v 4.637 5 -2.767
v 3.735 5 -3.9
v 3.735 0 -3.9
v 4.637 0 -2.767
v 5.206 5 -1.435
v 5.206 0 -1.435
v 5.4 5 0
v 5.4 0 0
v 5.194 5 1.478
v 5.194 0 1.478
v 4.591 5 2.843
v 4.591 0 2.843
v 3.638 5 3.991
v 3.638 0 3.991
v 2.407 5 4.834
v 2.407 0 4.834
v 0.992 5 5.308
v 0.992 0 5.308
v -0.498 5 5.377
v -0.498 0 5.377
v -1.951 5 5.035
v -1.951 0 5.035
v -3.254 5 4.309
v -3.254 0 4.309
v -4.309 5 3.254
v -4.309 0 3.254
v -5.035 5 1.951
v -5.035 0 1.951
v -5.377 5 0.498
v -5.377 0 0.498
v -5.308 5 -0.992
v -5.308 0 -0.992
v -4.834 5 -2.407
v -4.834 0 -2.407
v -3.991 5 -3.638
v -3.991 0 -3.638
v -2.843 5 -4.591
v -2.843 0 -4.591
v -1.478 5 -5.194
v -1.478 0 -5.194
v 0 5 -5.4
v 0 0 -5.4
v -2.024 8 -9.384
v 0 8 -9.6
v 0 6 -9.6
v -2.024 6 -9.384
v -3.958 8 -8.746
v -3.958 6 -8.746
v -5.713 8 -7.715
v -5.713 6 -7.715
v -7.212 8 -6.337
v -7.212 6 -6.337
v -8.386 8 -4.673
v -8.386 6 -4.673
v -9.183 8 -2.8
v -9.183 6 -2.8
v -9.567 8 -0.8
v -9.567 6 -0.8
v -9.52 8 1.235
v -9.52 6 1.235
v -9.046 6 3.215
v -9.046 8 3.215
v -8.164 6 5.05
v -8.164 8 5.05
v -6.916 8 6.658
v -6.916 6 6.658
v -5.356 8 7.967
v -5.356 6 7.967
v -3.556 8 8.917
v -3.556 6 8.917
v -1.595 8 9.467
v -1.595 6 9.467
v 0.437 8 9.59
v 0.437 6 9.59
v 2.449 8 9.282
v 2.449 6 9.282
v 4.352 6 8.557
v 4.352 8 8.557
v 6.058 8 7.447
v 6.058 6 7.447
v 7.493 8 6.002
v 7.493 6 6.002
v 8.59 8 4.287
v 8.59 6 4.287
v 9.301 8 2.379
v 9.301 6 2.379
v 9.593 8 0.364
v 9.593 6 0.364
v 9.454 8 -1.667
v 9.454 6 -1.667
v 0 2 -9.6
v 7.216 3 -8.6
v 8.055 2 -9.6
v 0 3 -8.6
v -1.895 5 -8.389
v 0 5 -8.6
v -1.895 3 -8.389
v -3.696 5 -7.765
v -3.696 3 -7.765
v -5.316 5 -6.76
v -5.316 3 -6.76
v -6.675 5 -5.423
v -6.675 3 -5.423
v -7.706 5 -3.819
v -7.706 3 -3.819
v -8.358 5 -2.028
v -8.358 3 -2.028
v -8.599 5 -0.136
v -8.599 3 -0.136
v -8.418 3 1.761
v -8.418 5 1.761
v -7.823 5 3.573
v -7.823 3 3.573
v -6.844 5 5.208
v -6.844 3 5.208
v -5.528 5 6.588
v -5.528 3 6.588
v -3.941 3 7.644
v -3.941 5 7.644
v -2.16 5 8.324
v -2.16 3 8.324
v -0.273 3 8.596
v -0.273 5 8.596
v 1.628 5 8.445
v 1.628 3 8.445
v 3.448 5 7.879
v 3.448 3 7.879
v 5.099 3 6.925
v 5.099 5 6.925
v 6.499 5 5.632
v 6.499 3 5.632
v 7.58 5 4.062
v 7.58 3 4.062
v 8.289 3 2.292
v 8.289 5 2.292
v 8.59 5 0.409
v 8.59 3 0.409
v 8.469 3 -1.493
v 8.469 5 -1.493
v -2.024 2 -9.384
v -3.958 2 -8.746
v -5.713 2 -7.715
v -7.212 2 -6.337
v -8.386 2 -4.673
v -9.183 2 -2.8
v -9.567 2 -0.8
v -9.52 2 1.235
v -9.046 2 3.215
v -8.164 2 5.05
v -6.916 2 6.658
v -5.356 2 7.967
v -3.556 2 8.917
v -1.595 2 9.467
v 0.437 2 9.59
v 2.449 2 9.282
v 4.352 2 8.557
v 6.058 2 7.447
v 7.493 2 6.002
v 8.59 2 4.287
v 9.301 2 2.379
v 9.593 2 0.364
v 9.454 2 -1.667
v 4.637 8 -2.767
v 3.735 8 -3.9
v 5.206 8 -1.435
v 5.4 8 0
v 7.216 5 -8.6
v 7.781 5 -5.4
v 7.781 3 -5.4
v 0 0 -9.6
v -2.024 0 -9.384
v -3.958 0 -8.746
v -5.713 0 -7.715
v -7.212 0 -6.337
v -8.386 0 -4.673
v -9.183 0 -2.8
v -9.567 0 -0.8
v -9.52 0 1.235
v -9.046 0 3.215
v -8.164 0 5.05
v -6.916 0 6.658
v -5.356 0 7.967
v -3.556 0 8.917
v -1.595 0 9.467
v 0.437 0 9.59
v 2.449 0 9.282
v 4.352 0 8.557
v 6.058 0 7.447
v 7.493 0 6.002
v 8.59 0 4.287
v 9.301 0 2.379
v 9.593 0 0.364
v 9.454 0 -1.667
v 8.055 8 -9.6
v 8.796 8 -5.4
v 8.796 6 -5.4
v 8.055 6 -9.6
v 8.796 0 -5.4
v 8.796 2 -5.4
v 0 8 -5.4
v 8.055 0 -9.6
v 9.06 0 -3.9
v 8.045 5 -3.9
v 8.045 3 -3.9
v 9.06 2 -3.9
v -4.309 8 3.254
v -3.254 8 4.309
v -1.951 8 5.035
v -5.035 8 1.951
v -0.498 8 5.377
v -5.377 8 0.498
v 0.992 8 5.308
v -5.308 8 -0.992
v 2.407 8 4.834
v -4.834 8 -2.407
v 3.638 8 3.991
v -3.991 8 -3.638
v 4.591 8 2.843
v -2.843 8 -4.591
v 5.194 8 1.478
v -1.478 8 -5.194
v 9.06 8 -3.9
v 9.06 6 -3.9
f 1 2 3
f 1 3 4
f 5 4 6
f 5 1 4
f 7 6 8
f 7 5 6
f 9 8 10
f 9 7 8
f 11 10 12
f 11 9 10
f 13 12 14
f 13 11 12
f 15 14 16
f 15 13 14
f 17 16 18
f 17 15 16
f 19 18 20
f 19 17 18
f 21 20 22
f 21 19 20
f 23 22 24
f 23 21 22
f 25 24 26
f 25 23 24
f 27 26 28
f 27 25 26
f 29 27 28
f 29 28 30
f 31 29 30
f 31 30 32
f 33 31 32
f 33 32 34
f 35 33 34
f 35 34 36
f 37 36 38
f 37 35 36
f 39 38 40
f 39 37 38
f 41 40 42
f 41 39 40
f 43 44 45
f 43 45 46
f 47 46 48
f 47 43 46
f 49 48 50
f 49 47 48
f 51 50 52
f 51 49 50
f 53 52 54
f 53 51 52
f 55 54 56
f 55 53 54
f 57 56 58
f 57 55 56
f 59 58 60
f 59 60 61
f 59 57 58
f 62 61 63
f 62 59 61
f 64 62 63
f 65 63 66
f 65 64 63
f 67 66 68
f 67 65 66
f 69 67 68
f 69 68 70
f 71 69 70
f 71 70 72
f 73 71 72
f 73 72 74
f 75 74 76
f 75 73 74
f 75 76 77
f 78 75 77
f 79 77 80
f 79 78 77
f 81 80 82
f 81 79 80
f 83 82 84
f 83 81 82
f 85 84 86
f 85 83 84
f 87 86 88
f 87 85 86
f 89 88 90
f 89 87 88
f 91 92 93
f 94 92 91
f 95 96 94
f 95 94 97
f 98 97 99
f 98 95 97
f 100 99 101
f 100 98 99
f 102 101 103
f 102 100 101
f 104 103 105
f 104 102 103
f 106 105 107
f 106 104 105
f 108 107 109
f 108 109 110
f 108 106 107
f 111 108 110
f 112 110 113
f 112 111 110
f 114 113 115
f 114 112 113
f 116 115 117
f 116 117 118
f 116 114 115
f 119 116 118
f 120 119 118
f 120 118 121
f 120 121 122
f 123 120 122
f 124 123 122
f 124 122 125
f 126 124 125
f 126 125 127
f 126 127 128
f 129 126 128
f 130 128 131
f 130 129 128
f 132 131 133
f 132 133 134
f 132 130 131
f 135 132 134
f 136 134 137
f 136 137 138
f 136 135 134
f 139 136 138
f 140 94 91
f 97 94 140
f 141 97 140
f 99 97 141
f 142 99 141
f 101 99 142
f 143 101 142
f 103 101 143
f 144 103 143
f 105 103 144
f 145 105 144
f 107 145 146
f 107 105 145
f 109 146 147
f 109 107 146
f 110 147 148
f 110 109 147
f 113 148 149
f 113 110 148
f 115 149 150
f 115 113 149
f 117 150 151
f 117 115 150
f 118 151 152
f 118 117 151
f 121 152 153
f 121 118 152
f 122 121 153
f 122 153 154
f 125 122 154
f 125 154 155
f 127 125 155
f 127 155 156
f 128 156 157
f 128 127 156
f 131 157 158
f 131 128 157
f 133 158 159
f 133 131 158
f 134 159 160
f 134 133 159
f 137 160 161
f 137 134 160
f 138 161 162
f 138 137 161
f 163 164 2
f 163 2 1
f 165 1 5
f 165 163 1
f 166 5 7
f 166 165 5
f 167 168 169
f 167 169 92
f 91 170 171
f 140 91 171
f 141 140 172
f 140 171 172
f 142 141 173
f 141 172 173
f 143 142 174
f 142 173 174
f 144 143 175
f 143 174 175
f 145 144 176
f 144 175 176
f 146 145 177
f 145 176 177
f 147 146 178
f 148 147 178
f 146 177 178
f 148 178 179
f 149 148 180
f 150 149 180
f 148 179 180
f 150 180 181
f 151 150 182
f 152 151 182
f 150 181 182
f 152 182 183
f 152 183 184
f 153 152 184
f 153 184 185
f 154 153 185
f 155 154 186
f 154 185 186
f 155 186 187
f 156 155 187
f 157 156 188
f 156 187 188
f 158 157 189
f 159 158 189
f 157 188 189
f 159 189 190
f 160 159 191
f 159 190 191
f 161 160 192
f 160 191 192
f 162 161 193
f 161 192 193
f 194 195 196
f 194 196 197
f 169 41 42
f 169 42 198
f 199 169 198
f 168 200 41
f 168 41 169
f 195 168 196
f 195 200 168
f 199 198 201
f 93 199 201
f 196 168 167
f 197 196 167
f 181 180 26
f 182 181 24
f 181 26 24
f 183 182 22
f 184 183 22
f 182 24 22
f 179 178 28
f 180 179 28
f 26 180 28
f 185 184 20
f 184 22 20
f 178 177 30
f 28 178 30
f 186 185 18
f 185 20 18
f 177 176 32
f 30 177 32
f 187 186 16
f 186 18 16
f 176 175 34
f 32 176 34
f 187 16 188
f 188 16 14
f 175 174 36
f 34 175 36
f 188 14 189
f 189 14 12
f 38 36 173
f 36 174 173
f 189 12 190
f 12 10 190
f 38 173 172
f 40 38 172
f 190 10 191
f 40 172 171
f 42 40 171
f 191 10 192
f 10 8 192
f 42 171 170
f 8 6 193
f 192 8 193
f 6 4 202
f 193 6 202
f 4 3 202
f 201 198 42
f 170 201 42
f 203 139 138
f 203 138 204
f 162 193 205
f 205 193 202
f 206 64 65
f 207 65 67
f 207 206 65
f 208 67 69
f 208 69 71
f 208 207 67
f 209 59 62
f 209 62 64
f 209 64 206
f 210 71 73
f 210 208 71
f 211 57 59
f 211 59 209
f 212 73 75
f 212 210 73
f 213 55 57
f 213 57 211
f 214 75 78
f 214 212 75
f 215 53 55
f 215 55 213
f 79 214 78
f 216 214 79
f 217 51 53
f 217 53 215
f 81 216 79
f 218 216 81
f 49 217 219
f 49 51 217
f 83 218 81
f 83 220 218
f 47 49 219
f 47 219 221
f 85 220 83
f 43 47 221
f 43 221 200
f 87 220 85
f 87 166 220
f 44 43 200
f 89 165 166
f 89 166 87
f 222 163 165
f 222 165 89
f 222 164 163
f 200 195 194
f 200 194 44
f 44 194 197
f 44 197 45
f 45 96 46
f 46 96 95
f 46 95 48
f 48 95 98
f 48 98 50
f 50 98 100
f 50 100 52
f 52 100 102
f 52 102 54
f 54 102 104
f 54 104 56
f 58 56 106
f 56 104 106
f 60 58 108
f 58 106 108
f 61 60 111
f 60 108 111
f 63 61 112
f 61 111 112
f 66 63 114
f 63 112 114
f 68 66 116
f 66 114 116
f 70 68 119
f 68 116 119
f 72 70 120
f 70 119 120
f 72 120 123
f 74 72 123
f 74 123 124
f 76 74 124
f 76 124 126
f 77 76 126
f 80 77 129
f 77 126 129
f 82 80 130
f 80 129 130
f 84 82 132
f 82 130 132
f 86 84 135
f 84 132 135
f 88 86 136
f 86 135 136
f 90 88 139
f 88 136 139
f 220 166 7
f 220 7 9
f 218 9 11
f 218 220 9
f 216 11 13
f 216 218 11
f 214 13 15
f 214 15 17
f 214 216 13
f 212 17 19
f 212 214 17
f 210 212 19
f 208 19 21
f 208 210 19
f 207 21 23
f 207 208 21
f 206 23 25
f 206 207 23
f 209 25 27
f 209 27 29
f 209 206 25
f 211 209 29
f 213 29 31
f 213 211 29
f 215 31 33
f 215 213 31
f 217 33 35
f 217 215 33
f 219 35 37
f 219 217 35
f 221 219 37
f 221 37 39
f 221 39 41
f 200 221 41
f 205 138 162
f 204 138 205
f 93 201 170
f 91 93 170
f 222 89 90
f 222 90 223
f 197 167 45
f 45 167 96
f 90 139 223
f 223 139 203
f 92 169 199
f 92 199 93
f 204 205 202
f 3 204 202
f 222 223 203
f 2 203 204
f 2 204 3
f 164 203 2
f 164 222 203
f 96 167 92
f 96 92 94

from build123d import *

# Parameters (mm, degrees)
BOSS_EXTRUDE1_DEPTH = 3
CHAMFER1_SIZE       = 1
BOSS_EXTRUDE2_DEPTH = 1


with BuildPart() as part:
    # Sketch1 → Boss-Extrude1 (new body)
    with BuildSketch(Plane(origin=(0, 0, 0), x_dir=(1, 0, 0), z_dir=(0, 1, 0))):
        with BuildLine():
            Line((8.055356459, 9.6), (0, 9.6))
            ThreePointArc((0, 9.6), (-6.170761053, -7.354026654), (9.454154429, 1.667022506))
            Line((9.454154429, 1.667022506), (9.060420249, 3.9))
            Line((9.060420249, 3.9), (3.734969879, 3.9))
            ThreePointArc((3.734969879, 3.9), (4.96632849, 2.120278596), (5.4, 0))
            ThreePointArc((5.4, 0), (-3.818376618, -3.818376618), (0, 5.4))
            Line((0, 5.4), (8.795929778, 5.4))
            Line((8.795929778, 5.4), (8.055356459, 9.6))
        make_face()
    extrude(amount=BOSS_EXTRUDE1_DEPTH)

    # Chamfer1
    chamfer1_edges = [part.edges().sort_by_distance(p)[0] for p in [
        (-6.170761053, 3, 7.354026654),
        (9.257287339, 3, -2.783511253),
        (8.425643119, 3, -7.5),
        (4.02767823, 3, -9.6),
    ]]
    chamfer(chamfer1_edges, length=CHAMFER1_SIZE)

    # Sketch3 → Boss-Extrude2 (add)
    with BuildSketch(Plane(origin=(0, 3, 0), x_dir=(1, 0, 0), z_dir=(0, 1, 0))):
        with BuildLine():
            Line((0, 5.4), (7.780503166, 5.4))
            Line((7.780503166, 5.4), (7.216256828, 8.6))
            Line((7.216256828, 8.6), (0, 8.6))
            ThreePointArc((0, 8.6), (-5.527973443, -6.587982211), (8.469346676, 1.493374328))
            Line((8.469346676, 1.493374328), (8.044993637, 3.9))
            Line((8.044993637, 3.9), (3.734969879, 3.9))
            ThreePointArc((3.734969879, 3.9), (-2.01246118, -5.010987927), (0, 5.4))
        make_face()
    extrude(amount=BOSS_EXTRUDE2_DEPTH)

    # Mirror1: part across plane


with BuildPart() as part_1:
    add(part.part)
    add(part.part.mirror(Plane.ZX.offset(4)))


solid = part_1.part
